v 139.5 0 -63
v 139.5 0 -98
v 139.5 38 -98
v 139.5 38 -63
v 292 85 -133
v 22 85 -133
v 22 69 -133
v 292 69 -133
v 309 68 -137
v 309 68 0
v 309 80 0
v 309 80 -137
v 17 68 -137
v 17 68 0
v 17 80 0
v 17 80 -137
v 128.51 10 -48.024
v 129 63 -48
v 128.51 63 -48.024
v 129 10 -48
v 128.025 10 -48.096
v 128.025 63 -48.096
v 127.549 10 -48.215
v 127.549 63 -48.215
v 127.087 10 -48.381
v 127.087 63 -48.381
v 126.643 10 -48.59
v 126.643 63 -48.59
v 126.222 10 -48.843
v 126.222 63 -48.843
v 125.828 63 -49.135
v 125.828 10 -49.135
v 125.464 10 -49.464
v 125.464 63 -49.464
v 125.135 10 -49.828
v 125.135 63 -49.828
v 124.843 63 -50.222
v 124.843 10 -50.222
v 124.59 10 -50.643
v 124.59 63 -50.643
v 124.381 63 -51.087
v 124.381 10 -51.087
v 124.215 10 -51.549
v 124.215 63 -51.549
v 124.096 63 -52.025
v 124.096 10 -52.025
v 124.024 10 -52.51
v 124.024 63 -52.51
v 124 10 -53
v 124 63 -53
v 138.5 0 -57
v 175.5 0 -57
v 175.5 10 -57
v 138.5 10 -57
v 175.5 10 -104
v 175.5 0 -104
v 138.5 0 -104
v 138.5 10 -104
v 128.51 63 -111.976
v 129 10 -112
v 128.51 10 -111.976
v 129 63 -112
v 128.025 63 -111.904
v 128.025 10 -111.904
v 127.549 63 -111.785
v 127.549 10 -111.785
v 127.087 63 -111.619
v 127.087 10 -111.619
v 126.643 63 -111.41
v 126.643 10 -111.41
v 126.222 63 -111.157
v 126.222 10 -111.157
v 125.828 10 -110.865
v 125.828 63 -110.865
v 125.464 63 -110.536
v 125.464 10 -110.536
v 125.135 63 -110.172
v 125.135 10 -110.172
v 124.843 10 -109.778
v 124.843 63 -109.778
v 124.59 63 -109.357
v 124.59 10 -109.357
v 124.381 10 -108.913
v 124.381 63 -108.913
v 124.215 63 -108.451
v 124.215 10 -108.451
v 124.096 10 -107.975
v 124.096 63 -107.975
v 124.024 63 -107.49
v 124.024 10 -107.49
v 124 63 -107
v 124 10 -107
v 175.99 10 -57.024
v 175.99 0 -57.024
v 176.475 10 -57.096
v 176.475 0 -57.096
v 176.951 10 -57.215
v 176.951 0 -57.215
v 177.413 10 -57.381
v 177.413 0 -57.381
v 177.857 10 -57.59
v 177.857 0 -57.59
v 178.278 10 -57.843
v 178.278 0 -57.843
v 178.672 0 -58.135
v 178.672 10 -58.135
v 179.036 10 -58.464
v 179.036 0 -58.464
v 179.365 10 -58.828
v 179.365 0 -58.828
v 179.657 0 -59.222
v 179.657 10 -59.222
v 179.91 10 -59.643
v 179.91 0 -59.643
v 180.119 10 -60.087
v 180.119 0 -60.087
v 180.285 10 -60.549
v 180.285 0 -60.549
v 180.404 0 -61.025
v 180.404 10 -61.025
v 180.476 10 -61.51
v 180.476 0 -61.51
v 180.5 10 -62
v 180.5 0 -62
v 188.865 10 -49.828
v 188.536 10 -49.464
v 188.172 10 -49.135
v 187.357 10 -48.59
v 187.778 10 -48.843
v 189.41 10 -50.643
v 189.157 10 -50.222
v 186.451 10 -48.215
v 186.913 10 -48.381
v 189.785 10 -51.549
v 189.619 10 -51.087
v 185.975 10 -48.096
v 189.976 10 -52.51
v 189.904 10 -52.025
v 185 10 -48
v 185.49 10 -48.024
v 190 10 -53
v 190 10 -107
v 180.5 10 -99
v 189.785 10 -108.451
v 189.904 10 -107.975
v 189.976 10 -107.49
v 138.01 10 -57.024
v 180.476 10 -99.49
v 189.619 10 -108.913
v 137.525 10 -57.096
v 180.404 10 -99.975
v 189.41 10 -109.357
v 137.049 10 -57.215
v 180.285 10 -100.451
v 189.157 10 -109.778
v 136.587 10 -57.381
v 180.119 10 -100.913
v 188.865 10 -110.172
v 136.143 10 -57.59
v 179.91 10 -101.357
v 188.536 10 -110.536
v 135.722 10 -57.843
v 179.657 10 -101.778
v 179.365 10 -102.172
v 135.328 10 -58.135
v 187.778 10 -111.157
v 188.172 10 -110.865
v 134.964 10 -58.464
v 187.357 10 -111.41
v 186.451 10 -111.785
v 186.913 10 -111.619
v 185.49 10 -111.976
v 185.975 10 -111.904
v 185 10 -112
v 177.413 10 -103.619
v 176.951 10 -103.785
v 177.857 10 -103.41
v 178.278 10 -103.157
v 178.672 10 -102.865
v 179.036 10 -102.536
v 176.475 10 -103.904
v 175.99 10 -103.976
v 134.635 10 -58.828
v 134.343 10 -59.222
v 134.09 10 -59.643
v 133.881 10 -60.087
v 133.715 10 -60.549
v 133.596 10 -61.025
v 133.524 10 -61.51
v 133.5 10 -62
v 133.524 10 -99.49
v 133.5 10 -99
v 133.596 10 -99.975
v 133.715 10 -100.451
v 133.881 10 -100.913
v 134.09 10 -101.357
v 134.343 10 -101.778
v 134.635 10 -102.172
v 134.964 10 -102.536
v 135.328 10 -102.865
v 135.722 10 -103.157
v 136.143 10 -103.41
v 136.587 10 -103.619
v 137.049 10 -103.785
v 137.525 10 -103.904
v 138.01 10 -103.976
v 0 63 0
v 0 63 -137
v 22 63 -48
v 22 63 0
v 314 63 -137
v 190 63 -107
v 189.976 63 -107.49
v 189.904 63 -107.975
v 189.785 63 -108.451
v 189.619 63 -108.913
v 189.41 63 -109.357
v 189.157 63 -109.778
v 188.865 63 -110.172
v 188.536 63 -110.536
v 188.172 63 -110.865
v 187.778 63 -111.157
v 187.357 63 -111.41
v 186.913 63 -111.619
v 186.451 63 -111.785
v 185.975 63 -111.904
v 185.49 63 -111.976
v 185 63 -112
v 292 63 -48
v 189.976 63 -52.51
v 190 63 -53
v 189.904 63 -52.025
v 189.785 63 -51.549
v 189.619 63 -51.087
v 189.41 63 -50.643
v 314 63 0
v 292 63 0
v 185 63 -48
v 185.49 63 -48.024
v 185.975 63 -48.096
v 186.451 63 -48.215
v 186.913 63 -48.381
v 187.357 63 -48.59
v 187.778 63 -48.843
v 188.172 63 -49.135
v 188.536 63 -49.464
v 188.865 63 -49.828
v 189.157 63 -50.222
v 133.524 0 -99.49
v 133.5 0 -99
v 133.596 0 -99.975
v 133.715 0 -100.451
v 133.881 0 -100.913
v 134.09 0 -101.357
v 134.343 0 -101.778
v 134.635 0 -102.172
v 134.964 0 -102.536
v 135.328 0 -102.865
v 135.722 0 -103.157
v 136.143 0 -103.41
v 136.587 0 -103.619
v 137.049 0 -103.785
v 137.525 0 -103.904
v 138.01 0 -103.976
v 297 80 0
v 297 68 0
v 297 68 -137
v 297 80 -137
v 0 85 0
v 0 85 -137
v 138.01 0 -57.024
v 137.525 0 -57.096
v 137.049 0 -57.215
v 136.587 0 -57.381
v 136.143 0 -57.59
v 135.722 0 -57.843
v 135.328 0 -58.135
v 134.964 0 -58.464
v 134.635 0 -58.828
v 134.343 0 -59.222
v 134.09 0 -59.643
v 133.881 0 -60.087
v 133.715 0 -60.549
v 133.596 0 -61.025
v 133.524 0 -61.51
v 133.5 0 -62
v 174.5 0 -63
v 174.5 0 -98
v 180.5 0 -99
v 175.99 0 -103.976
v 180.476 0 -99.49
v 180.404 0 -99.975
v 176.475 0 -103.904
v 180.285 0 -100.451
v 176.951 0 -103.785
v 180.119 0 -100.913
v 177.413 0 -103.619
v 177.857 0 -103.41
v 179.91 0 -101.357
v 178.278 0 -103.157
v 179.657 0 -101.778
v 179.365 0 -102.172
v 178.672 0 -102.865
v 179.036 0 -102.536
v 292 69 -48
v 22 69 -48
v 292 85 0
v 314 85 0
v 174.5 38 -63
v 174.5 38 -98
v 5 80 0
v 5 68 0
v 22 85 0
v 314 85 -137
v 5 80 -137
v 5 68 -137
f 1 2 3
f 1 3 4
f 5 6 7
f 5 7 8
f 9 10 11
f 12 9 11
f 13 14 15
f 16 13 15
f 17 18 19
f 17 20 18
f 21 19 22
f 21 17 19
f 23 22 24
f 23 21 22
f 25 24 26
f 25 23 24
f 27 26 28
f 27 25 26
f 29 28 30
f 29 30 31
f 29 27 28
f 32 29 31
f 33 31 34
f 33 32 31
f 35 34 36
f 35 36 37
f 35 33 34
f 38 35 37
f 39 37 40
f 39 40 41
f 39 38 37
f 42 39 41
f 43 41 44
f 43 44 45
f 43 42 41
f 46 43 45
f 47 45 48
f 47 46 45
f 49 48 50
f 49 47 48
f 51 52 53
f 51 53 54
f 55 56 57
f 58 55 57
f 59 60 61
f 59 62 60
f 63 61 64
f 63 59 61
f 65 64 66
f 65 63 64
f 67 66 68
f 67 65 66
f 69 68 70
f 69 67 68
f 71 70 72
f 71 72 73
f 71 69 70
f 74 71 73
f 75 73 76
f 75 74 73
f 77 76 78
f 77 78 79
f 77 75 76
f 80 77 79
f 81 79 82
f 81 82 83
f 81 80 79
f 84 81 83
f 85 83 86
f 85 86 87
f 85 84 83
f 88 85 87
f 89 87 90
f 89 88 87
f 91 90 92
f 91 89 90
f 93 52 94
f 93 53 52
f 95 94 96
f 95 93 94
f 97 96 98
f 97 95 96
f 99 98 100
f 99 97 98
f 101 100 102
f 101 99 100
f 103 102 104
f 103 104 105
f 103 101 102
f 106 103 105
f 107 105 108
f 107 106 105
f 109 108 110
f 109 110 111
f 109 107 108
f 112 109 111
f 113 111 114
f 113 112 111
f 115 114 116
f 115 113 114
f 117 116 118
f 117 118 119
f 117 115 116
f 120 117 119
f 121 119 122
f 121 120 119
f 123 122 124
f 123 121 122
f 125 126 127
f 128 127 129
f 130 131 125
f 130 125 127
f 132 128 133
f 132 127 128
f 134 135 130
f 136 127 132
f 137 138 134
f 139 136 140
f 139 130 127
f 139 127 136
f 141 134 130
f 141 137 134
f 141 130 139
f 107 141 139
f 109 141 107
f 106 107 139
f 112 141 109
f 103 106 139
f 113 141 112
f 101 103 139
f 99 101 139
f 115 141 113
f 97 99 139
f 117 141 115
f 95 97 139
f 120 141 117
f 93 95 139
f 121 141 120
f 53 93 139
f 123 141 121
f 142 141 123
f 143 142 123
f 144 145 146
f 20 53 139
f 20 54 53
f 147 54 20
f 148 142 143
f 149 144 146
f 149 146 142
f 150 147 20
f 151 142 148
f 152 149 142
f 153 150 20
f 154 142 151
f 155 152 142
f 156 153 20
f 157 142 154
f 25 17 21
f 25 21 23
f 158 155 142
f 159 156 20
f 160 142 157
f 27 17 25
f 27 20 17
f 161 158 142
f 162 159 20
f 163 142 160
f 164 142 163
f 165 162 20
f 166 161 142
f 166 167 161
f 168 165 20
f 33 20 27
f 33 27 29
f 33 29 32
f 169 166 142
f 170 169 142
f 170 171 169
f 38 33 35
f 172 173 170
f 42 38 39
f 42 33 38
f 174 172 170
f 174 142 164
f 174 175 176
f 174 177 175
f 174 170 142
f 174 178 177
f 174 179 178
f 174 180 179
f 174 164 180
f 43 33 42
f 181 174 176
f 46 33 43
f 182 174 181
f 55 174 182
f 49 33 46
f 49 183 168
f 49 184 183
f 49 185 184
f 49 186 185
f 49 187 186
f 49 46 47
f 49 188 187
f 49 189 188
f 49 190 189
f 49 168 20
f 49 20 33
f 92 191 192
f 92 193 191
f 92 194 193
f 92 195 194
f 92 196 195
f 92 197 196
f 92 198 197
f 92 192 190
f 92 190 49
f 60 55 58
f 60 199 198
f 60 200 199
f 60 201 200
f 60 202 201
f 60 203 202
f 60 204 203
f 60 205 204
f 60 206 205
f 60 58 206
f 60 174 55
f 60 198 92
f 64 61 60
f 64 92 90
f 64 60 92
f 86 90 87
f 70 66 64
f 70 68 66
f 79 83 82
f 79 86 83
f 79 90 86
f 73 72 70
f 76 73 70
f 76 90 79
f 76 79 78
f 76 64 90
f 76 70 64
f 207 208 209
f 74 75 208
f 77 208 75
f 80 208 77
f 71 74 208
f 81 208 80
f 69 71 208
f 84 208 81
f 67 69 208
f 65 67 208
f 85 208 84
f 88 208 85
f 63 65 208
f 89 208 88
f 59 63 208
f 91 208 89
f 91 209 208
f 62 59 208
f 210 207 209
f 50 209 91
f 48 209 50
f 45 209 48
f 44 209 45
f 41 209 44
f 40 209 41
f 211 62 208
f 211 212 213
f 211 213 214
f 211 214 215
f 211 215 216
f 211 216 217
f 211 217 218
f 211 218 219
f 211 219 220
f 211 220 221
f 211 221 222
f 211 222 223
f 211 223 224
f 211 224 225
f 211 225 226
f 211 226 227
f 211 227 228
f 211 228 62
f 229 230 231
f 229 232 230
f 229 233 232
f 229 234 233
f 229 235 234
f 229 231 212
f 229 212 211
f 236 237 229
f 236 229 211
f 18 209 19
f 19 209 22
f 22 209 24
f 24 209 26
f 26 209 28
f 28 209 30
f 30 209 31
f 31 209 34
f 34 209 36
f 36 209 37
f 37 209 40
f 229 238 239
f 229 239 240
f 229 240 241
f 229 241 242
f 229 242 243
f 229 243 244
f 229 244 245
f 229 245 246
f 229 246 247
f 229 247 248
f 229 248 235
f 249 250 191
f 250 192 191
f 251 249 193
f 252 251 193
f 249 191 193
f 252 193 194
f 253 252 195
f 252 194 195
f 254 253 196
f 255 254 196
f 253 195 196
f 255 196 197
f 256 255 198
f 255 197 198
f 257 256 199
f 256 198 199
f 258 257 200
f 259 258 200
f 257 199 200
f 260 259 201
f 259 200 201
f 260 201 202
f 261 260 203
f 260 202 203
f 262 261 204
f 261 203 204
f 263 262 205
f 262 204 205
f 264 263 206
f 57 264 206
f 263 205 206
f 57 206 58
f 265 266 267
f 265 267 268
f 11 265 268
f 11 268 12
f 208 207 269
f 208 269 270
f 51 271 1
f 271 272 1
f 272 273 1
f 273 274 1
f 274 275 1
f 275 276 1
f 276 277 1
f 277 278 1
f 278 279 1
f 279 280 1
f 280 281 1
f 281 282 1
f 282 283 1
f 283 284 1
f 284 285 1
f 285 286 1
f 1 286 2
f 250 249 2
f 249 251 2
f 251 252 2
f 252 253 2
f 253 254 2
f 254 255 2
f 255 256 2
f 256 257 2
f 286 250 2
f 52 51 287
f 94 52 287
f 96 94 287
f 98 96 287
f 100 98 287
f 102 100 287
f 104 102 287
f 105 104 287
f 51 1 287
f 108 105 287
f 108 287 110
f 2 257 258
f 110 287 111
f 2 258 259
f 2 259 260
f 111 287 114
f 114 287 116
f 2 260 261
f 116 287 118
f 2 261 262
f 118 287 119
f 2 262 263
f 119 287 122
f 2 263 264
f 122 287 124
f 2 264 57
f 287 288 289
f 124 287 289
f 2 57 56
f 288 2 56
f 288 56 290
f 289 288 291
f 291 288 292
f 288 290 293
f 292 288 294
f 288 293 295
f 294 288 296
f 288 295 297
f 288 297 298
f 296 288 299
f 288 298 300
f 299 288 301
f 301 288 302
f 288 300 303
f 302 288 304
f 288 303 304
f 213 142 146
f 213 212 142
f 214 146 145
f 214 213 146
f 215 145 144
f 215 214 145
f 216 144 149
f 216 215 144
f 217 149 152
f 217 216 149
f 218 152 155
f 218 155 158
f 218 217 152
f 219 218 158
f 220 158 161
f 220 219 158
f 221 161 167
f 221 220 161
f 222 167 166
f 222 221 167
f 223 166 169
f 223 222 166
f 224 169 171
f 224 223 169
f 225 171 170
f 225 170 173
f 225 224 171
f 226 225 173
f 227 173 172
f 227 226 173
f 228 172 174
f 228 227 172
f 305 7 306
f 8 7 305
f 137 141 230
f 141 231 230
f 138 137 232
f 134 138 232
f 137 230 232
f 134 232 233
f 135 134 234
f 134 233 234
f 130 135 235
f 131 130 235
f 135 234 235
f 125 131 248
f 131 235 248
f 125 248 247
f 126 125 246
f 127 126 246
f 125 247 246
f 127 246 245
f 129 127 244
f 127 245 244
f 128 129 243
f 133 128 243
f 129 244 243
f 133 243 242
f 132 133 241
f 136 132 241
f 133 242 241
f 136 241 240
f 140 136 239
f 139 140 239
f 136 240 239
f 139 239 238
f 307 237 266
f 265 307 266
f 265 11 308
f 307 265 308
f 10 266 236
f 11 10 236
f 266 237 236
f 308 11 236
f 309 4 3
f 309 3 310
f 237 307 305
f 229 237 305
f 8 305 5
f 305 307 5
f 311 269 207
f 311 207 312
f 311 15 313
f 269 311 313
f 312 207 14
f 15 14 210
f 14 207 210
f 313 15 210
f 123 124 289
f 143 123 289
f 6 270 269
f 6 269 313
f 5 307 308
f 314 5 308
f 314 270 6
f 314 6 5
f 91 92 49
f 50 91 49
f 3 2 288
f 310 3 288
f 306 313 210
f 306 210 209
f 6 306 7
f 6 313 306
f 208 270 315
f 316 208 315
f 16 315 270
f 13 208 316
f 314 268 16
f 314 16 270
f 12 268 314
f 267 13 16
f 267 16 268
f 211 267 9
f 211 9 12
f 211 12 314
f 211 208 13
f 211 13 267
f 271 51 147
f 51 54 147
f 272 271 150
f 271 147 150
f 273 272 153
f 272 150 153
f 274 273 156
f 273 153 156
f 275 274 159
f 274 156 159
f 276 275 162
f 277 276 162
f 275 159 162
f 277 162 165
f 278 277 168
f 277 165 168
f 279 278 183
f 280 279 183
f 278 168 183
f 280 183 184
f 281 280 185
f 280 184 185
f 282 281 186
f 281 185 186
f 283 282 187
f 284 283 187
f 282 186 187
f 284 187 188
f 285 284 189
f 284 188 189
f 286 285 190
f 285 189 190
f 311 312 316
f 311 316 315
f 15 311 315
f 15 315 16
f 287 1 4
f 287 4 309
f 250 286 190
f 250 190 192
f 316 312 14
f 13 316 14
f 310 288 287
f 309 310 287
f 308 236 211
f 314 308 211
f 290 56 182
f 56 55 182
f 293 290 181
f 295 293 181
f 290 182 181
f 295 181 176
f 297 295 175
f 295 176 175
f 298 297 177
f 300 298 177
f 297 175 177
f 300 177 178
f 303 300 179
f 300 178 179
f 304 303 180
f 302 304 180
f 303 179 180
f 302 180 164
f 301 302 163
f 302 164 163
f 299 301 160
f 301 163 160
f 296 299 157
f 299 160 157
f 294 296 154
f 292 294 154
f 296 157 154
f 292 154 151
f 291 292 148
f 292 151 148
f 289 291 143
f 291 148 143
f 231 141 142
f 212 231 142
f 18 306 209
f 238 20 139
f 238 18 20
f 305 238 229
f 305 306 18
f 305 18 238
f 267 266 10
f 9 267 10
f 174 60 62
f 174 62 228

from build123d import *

# Parameters (mm, degrees)
ESQUISSE1_W             = 314
ESQUISSE1_H             = 137
BOSS_EXTRU_1_DEPTH      = 85
ESQUISSE2_W             = 124
ESQUISSE2_H             = 137
ENL_V_MAT_EXTRU_1_DEPTH = 63
ESQUISSE3_W             = 124
ESQUISSE3_H             = 137
ENL_V_MAT_EXTRU_2_DEPTH = 63
ESQUISSE4_W             = 66
ESQUISSE4_H             = 25
ENL_V_MAT_EXTRU_3_DEPTH = 63
ESQUISSE7_W             = 270
ESQUISSE7_H             = 133
ENL_V_MAT_EXTRU_6_DEPTH = 16
ESQUISSE8_W             = 12
ESQUISSE8_H             = 12
ENL_V_MAT_EXTRU_7_DEPTH = 140
ESQUISSE9_W             = 270
ESQUISSE9_H             = 48
ENL_V_MAT_EXTRU_8_DEPTH = 140
ESQUISSE5_W             = 35
ESQUISSE5_H             = 35
ENL_V_MAT_EXTRU_4_DEPTH = 38
ESQUISSE6_W             = 66
ESQUISSE6_H             = 64
ESQUISSE6_W_2           = 47
ESQUISSE6_H_2           = 47
ENL_V_MAT_EXTRU_5_DEPTH = 10
CONG_1_R                = 5
CONG_2_R                = 5


with BuildPart() as part:
    # Esquisse1 → Boss.-Extru.1 (new body)
    with BuildSketch(Plane(origin=(0, 0, 0), x_dir=(1, 0, 0), z_dir=(0, 1, 0))):
        with Locations((157, 68.5)):
            Rectangle(ESQUISSE1_W, ESQUISSE1_H)
    extrude(amount=BOSS_EXTRU_1_DEPTH)

    # Esquisse2 → Enlèv. mat.-Extru.1 (cut)
    with BuildSketch(Plane.XZ):
        with Locations((62, -68.5)):
            Rectangle(ESQUISSE2_W, ESQUISSE2_H)
    extrude(amount=-ENL_V_MAT_EXTRU_1_DEPTH, mode=Mode.SUBTRACT)

    # Esquisse3 → Enlèv. mat.-Extru.2 (cut)
    with BuildSketch(Plane(origin=(0, 0, 0), x_dir=(-1, 0, 0), z_dir=(0, -1, 0))):
        with Locations((-252, 68.5)):
            Rectangle(ESQUISSE3_W, ESQUISSE3_H)
    extrude(amount=-ENL_V_MAT_EXTRU_2_DEPTH, mode=Mode.SUBTRACT)

    # Esquisse4 → Enlèv. mat.-Extru.3 (cut)
    with BuildSketch(Plane.XZ):
        with Locations((157, -124.5)):
            Rectangle(ESQUISSE4_W, ESQUISSE4_H)
    extrude(amount=-ENL_V_MAT_EXTRU_3_DEPTH, mode=Mode.SUBTRACT)

    # Esquisse7 → Enlèv. mat.-Extru.6 (cut)
    with BuildSketch(Plane(origin=(0, 85, 0), x_dir=(1, 0, 0), z_dir=(0, 1, 0))):
        with Locations((157, 66.5)):
            Rectangle(ESQUISSE7_W, ESQUISSE7_H)
    extrude(amount=-ENL_V_MAT_EXTRU_6_DEPTH, mode=Mode.SUBTRACT)

    # Esquisse8 → Enlèv. mat.-Extru.7 (cut)
    with BuildSketch(Plane.XY):
        with Locations((11, 74)):
            Rectangle(ESQUISSE8_W, ESQUISSE8_H)
        with Locations((303, 74)):
            Rectangle(ESQUISSE8_W, ESQUISSE8_H)
    extrude(amount=-ENL_V_MAT_EXTRU_7_DEPTH, mode=Mode.SUBTRACT)

    # Esquisse9 → Enlèv. mat.-Extru.8 (cut)
    with BuildSketch(Plane(origin=(0, 85, 0), x_dir=(1, 0, 0), z_dir=(0, 1, 0))):
        with Locations((157, 24)):
            Rectangle(ESQUISSE9_W, ESQUISSE9_H)
    extrude(amount=-ENL_V_MAT_EXTRU_8_DEPTH, mode=Mode.SUBTRACT)

    # Esquisse5 → Enlèv. mat.-Extru.4 (cut)
    with BuildSketch(Plane.XZ):
        with Locations((157, -80.5)):
            Rectangle(ESQUISSE5_W, ESQUISSE5_H)
    extrude(amount=-ENL_V_MAT_EXTRU_4_DEPTH, mode=Mode.SUBTRACT)

    # Esquisse6 → Enlèv. mat.-Extru.5 (cut)
    with BuildSketch(Plane(origin=(0, 0, 0), x_dir=(-1, 0, 0), z_dir=(0, -1, 0))):
        with Locations((-157, 80)):
            Rectangle(ESQUISSE6_W, ESQUISSE6_H)
        with Locations((-157, 80.5)):
            Rectangle(ESQUISSE6_W_2, ESQUISSE6_H_2, mode=Mode.SUBTRACT)
    extrude(amount=-ENL_V_MAT_EXTRU_5_DEPTH, mode=Mode.SUBTRACT)

    # Congé1
    cong_1_edges = [part.edges().sort_by_distance(p)[0] for p in [
        (180.5, 5, -57),
        (133.5, 5, -57),
        (133.5, 5, -104),
        (180.5, 5, -104),
    ]]
    fillet(cong_1_edges, radius=CONG_1_R)

    # Congé2
    cong_2_edges = [part.edges().sort_by_distance(p)[0] for p in [
        (190, 36.5, -48),
        (124, 36.5, -48),
        (124, 36.5, -112),
        (190, 36.5, -112),
    ]]
    fillet(cong_2_edges, radius=CONG_2_R)


solid = part.part
